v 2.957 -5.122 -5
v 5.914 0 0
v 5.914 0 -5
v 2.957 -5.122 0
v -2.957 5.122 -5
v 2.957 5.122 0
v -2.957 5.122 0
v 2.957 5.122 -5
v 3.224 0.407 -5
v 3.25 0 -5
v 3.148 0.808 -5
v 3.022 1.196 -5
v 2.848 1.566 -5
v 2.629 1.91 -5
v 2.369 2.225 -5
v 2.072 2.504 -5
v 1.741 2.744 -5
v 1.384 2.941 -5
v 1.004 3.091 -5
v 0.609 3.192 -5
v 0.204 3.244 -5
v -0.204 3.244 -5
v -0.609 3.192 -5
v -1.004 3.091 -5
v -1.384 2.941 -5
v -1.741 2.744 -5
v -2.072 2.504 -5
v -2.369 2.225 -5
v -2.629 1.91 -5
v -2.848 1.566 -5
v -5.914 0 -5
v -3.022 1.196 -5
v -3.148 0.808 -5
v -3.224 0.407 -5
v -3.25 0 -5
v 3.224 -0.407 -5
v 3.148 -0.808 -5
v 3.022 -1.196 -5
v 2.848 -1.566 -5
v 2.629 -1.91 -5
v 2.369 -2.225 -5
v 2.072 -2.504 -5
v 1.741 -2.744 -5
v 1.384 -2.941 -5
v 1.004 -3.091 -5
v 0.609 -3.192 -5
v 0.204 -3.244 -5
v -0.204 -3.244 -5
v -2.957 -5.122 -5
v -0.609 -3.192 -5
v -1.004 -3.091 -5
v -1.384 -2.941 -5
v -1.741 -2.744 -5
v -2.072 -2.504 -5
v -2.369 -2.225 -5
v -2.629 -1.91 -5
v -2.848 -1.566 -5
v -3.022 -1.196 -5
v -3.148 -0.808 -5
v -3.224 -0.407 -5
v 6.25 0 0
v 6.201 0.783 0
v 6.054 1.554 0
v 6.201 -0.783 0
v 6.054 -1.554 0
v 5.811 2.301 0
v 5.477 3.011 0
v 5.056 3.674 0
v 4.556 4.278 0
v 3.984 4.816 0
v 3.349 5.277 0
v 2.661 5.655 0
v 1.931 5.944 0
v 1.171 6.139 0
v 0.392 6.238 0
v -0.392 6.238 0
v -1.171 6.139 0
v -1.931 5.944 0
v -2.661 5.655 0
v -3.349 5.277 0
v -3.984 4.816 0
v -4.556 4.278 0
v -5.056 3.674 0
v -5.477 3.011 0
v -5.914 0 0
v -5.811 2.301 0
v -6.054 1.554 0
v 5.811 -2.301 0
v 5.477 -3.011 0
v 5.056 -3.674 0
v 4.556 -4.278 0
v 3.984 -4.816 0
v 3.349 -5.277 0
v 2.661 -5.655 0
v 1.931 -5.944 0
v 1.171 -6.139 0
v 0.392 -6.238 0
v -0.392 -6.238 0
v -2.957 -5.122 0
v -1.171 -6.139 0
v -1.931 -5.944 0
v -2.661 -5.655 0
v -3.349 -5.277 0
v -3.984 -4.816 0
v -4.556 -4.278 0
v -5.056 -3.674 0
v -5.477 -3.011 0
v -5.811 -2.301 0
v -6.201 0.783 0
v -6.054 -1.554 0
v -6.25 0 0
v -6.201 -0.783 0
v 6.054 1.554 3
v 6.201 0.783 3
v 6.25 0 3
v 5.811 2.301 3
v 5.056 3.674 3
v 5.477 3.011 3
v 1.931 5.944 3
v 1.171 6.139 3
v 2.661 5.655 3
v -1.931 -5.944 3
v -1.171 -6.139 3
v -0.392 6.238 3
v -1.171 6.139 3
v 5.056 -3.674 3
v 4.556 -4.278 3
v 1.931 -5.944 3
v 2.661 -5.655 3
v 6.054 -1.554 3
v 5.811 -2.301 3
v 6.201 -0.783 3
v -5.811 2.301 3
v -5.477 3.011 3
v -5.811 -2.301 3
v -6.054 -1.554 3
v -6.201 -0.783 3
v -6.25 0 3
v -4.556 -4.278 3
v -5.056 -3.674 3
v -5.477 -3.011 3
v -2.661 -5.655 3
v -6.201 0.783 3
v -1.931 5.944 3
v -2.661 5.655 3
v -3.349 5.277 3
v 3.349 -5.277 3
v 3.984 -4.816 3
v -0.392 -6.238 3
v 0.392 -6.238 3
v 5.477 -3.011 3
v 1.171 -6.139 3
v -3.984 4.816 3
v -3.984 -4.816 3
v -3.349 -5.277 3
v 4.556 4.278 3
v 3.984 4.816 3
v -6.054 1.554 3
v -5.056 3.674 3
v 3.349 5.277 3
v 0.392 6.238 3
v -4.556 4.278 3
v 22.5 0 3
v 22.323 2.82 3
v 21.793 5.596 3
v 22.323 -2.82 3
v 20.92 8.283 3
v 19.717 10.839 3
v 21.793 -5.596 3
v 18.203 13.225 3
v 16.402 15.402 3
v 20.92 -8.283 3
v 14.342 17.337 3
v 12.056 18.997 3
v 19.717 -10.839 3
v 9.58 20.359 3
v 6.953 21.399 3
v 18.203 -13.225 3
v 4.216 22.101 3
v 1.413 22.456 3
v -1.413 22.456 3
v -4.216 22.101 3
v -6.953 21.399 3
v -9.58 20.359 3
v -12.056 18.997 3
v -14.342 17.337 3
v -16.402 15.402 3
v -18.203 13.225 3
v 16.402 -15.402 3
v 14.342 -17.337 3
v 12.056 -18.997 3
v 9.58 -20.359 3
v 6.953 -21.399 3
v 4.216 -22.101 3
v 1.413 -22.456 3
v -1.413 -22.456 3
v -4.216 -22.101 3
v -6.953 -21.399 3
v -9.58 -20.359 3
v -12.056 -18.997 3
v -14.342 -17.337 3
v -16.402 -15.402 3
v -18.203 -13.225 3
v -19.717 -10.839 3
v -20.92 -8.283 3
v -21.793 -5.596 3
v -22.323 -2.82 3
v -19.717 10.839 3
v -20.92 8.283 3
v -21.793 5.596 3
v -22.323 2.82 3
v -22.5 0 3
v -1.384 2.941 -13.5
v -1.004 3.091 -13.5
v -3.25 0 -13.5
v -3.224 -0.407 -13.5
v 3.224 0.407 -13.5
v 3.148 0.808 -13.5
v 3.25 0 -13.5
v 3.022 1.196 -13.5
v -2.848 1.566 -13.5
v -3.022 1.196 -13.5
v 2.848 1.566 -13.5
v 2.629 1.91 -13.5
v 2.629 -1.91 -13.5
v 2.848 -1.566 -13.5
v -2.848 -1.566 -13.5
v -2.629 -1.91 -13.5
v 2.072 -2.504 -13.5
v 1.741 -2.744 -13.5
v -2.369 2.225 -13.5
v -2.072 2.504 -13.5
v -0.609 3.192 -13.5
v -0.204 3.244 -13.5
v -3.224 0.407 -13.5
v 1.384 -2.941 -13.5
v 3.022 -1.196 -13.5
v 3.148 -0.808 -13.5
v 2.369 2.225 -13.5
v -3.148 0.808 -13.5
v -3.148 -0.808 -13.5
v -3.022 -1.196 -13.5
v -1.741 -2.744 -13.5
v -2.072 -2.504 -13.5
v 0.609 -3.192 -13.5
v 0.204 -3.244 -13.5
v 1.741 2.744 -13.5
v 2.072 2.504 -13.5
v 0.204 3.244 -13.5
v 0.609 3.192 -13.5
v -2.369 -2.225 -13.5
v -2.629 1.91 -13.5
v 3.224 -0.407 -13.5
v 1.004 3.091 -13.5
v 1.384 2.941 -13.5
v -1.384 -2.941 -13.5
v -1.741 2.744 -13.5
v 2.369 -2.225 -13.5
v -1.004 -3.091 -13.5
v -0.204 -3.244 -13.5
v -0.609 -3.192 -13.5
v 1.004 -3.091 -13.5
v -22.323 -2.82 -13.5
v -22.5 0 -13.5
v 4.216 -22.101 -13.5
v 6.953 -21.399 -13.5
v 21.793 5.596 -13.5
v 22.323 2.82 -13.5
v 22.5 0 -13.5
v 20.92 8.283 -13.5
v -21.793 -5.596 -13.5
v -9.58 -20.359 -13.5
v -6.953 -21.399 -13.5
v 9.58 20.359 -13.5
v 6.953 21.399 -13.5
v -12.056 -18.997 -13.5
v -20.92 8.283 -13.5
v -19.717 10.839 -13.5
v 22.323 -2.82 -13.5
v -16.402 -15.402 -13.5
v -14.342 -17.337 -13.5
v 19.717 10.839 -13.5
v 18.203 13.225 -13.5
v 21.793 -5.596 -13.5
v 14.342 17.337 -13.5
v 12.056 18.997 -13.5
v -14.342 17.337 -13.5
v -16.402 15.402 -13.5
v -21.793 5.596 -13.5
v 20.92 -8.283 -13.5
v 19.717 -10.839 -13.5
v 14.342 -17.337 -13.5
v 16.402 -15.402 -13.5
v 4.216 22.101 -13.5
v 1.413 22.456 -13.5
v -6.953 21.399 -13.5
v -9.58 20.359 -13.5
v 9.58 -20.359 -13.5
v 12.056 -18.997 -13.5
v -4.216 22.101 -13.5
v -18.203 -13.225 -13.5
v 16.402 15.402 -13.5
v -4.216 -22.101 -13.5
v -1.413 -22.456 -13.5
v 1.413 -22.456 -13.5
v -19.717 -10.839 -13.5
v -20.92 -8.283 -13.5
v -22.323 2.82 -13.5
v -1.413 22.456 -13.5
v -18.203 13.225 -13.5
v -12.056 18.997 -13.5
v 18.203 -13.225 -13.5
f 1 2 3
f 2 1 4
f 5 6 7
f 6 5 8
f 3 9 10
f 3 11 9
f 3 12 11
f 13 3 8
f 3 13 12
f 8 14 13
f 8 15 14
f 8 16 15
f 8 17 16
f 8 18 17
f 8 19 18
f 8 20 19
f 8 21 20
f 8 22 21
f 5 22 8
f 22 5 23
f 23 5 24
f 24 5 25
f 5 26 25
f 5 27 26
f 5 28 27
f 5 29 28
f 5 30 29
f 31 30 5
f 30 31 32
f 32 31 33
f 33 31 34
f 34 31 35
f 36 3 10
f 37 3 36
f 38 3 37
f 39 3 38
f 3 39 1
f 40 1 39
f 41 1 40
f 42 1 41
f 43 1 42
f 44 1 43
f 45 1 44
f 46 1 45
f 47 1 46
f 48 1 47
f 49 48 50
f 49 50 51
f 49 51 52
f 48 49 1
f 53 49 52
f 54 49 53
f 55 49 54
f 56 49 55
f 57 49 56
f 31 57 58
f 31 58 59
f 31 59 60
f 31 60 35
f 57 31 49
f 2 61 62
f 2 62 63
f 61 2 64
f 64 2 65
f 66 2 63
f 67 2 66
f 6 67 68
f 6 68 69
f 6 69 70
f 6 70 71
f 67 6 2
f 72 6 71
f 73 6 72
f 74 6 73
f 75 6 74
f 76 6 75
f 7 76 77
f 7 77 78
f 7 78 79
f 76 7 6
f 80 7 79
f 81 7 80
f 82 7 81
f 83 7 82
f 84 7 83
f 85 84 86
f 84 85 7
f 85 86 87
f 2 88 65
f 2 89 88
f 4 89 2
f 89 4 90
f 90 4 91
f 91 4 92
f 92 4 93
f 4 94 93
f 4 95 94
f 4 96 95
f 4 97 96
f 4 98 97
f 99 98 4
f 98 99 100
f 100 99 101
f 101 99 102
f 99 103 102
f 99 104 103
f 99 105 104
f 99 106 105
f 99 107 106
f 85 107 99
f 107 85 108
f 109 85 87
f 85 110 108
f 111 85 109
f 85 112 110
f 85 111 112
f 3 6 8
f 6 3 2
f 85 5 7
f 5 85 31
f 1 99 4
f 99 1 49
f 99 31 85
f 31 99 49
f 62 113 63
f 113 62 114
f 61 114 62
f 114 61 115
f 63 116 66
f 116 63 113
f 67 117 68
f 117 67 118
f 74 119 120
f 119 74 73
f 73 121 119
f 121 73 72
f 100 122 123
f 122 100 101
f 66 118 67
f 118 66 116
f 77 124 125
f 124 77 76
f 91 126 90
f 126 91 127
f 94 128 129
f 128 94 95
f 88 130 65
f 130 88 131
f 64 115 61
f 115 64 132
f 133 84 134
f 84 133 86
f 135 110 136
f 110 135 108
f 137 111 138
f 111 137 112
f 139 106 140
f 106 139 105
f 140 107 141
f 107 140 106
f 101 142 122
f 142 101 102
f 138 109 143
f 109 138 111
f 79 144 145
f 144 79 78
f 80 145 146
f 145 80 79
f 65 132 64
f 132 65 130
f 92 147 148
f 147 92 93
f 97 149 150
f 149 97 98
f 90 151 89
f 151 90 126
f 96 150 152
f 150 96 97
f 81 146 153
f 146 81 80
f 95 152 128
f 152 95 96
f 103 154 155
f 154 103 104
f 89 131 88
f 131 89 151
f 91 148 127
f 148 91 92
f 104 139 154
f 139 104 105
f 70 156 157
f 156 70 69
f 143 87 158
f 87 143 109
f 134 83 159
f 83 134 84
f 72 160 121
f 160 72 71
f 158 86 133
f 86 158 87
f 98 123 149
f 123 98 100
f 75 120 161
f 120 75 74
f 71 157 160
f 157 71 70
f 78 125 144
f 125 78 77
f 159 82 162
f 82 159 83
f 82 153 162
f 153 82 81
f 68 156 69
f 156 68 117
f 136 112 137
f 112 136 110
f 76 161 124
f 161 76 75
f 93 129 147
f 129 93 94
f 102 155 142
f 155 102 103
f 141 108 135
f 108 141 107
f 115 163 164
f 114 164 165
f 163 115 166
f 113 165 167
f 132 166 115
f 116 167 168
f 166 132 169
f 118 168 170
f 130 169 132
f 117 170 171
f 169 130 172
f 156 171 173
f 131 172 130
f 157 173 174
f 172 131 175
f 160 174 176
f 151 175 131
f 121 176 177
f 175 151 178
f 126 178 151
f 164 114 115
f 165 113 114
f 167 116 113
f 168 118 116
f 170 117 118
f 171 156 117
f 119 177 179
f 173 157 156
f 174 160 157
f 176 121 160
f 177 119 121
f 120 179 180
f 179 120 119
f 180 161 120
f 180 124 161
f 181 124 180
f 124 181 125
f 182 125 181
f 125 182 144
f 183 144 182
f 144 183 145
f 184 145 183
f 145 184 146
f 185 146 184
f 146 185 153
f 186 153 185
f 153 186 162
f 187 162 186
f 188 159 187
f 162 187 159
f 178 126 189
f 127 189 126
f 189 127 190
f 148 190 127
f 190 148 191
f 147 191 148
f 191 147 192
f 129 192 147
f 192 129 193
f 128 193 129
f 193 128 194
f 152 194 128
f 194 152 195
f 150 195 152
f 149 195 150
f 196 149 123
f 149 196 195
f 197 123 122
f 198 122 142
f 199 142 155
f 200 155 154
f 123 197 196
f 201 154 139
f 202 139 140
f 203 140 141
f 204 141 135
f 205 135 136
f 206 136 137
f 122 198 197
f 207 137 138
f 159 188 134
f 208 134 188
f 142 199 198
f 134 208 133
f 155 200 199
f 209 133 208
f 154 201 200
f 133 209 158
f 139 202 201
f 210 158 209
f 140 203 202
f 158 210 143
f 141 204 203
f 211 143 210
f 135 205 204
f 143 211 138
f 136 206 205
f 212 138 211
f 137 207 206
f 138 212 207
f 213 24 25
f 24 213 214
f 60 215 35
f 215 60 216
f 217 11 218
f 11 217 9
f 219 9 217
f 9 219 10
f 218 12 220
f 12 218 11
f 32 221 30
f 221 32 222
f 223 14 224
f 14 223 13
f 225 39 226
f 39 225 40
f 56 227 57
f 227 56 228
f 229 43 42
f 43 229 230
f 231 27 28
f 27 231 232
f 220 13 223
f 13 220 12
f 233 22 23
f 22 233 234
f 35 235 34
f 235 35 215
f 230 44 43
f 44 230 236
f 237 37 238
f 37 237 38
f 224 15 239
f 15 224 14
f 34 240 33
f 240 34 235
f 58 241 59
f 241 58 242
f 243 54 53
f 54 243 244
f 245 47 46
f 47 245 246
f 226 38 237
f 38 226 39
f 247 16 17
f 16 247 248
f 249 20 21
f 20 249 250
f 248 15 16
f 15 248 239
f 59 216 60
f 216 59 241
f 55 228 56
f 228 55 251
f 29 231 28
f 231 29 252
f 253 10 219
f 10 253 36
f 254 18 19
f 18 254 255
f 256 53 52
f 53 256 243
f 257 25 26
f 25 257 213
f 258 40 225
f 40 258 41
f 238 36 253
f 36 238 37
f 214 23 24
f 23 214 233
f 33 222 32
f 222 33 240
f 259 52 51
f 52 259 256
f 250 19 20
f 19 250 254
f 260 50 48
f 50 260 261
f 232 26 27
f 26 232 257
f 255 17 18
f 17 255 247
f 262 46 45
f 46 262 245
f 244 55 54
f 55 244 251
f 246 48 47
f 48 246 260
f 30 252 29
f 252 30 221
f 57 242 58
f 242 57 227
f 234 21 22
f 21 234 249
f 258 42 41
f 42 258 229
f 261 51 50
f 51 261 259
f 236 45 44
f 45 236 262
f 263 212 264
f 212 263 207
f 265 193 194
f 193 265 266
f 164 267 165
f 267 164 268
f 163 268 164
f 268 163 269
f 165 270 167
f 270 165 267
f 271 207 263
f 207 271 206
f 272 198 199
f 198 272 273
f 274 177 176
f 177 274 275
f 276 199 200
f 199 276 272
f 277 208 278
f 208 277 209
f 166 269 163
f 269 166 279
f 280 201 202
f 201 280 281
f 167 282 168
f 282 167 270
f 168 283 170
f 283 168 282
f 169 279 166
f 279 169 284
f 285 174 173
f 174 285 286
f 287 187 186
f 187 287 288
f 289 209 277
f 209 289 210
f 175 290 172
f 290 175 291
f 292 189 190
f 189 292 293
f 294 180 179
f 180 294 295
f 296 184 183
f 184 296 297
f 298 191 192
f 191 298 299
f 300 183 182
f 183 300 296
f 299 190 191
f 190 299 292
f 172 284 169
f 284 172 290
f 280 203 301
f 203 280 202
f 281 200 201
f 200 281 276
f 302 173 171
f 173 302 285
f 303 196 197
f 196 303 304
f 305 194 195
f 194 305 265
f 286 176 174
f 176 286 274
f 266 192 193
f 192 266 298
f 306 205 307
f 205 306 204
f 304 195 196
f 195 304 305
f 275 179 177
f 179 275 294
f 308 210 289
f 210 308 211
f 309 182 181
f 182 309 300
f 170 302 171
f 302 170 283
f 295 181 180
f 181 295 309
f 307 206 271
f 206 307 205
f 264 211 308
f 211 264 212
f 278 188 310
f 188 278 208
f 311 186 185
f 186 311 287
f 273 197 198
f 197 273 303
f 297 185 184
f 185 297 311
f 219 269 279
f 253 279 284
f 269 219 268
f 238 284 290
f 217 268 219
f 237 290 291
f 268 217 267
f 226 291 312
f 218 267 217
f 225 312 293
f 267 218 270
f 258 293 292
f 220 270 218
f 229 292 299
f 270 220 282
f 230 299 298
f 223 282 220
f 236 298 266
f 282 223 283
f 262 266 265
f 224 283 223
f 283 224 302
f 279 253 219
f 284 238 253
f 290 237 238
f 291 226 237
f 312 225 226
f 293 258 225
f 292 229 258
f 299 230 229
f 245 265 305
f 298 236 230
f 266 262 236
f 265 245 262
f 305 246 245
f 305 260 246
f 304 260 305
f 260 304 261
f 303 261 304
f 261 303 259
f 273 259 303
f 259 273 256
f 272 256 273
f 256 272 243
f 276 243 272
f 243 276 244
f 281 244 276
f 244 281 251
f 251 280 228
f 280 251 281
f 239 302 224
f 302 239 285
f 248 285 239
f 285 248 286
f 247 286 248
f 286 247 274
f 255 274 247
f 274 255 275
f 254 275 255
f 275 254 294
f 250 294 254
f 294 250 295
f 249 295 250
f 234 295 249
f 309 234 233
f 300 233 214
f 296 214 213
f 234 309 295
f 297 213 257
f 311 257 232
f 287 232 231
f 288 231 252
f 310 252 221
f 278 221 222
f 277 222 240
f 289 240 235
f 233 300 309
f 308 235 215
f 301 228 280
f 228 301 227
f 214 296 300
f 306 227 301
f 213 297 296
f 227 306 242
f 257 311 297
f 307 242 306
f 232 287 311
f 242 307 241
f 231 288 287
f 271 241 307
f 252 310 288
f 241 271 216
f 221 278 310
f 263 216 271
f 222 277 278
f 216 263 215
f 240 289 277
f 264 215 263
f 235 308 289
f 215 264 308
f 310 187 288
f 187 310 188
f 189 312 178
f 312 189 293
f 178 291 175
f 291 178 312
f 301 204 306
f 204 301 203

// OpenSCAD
$fn = 50;


difference() {
	union() {
		translate(v = [0, 0, -13.5000000000]) {
			cylinder(h = 16.5000000000, r = 22.5000000000);
		}
	}
	union() {
		translate(v = [0, 0, 0]) {
			rotate(a = [0, 0, 0]) {
				difference() {
					union() {
						translate(v = [0, 0, -5]) {
							linear_extrude(height = 5) {
								polygon(points = [[5.9142500000, 0.0000000000], [2.9571250000, 5.1218907443], [-2.9571250000, 5.1218907443], [-5.9142500000, 0.0000000000], [-2.9571250000, -5.1218907443], [2.9571250000, -5.1218907443]]);
							}
						}
					}
					union();
				}
			}
		}
		#cylinder(h = 3, r = 6.2500000000);
		#translate(v = [0, 0, -100.0000000000]) {
			cylinder(h = 200, r = 3.2500000000);
		}
	}
}
